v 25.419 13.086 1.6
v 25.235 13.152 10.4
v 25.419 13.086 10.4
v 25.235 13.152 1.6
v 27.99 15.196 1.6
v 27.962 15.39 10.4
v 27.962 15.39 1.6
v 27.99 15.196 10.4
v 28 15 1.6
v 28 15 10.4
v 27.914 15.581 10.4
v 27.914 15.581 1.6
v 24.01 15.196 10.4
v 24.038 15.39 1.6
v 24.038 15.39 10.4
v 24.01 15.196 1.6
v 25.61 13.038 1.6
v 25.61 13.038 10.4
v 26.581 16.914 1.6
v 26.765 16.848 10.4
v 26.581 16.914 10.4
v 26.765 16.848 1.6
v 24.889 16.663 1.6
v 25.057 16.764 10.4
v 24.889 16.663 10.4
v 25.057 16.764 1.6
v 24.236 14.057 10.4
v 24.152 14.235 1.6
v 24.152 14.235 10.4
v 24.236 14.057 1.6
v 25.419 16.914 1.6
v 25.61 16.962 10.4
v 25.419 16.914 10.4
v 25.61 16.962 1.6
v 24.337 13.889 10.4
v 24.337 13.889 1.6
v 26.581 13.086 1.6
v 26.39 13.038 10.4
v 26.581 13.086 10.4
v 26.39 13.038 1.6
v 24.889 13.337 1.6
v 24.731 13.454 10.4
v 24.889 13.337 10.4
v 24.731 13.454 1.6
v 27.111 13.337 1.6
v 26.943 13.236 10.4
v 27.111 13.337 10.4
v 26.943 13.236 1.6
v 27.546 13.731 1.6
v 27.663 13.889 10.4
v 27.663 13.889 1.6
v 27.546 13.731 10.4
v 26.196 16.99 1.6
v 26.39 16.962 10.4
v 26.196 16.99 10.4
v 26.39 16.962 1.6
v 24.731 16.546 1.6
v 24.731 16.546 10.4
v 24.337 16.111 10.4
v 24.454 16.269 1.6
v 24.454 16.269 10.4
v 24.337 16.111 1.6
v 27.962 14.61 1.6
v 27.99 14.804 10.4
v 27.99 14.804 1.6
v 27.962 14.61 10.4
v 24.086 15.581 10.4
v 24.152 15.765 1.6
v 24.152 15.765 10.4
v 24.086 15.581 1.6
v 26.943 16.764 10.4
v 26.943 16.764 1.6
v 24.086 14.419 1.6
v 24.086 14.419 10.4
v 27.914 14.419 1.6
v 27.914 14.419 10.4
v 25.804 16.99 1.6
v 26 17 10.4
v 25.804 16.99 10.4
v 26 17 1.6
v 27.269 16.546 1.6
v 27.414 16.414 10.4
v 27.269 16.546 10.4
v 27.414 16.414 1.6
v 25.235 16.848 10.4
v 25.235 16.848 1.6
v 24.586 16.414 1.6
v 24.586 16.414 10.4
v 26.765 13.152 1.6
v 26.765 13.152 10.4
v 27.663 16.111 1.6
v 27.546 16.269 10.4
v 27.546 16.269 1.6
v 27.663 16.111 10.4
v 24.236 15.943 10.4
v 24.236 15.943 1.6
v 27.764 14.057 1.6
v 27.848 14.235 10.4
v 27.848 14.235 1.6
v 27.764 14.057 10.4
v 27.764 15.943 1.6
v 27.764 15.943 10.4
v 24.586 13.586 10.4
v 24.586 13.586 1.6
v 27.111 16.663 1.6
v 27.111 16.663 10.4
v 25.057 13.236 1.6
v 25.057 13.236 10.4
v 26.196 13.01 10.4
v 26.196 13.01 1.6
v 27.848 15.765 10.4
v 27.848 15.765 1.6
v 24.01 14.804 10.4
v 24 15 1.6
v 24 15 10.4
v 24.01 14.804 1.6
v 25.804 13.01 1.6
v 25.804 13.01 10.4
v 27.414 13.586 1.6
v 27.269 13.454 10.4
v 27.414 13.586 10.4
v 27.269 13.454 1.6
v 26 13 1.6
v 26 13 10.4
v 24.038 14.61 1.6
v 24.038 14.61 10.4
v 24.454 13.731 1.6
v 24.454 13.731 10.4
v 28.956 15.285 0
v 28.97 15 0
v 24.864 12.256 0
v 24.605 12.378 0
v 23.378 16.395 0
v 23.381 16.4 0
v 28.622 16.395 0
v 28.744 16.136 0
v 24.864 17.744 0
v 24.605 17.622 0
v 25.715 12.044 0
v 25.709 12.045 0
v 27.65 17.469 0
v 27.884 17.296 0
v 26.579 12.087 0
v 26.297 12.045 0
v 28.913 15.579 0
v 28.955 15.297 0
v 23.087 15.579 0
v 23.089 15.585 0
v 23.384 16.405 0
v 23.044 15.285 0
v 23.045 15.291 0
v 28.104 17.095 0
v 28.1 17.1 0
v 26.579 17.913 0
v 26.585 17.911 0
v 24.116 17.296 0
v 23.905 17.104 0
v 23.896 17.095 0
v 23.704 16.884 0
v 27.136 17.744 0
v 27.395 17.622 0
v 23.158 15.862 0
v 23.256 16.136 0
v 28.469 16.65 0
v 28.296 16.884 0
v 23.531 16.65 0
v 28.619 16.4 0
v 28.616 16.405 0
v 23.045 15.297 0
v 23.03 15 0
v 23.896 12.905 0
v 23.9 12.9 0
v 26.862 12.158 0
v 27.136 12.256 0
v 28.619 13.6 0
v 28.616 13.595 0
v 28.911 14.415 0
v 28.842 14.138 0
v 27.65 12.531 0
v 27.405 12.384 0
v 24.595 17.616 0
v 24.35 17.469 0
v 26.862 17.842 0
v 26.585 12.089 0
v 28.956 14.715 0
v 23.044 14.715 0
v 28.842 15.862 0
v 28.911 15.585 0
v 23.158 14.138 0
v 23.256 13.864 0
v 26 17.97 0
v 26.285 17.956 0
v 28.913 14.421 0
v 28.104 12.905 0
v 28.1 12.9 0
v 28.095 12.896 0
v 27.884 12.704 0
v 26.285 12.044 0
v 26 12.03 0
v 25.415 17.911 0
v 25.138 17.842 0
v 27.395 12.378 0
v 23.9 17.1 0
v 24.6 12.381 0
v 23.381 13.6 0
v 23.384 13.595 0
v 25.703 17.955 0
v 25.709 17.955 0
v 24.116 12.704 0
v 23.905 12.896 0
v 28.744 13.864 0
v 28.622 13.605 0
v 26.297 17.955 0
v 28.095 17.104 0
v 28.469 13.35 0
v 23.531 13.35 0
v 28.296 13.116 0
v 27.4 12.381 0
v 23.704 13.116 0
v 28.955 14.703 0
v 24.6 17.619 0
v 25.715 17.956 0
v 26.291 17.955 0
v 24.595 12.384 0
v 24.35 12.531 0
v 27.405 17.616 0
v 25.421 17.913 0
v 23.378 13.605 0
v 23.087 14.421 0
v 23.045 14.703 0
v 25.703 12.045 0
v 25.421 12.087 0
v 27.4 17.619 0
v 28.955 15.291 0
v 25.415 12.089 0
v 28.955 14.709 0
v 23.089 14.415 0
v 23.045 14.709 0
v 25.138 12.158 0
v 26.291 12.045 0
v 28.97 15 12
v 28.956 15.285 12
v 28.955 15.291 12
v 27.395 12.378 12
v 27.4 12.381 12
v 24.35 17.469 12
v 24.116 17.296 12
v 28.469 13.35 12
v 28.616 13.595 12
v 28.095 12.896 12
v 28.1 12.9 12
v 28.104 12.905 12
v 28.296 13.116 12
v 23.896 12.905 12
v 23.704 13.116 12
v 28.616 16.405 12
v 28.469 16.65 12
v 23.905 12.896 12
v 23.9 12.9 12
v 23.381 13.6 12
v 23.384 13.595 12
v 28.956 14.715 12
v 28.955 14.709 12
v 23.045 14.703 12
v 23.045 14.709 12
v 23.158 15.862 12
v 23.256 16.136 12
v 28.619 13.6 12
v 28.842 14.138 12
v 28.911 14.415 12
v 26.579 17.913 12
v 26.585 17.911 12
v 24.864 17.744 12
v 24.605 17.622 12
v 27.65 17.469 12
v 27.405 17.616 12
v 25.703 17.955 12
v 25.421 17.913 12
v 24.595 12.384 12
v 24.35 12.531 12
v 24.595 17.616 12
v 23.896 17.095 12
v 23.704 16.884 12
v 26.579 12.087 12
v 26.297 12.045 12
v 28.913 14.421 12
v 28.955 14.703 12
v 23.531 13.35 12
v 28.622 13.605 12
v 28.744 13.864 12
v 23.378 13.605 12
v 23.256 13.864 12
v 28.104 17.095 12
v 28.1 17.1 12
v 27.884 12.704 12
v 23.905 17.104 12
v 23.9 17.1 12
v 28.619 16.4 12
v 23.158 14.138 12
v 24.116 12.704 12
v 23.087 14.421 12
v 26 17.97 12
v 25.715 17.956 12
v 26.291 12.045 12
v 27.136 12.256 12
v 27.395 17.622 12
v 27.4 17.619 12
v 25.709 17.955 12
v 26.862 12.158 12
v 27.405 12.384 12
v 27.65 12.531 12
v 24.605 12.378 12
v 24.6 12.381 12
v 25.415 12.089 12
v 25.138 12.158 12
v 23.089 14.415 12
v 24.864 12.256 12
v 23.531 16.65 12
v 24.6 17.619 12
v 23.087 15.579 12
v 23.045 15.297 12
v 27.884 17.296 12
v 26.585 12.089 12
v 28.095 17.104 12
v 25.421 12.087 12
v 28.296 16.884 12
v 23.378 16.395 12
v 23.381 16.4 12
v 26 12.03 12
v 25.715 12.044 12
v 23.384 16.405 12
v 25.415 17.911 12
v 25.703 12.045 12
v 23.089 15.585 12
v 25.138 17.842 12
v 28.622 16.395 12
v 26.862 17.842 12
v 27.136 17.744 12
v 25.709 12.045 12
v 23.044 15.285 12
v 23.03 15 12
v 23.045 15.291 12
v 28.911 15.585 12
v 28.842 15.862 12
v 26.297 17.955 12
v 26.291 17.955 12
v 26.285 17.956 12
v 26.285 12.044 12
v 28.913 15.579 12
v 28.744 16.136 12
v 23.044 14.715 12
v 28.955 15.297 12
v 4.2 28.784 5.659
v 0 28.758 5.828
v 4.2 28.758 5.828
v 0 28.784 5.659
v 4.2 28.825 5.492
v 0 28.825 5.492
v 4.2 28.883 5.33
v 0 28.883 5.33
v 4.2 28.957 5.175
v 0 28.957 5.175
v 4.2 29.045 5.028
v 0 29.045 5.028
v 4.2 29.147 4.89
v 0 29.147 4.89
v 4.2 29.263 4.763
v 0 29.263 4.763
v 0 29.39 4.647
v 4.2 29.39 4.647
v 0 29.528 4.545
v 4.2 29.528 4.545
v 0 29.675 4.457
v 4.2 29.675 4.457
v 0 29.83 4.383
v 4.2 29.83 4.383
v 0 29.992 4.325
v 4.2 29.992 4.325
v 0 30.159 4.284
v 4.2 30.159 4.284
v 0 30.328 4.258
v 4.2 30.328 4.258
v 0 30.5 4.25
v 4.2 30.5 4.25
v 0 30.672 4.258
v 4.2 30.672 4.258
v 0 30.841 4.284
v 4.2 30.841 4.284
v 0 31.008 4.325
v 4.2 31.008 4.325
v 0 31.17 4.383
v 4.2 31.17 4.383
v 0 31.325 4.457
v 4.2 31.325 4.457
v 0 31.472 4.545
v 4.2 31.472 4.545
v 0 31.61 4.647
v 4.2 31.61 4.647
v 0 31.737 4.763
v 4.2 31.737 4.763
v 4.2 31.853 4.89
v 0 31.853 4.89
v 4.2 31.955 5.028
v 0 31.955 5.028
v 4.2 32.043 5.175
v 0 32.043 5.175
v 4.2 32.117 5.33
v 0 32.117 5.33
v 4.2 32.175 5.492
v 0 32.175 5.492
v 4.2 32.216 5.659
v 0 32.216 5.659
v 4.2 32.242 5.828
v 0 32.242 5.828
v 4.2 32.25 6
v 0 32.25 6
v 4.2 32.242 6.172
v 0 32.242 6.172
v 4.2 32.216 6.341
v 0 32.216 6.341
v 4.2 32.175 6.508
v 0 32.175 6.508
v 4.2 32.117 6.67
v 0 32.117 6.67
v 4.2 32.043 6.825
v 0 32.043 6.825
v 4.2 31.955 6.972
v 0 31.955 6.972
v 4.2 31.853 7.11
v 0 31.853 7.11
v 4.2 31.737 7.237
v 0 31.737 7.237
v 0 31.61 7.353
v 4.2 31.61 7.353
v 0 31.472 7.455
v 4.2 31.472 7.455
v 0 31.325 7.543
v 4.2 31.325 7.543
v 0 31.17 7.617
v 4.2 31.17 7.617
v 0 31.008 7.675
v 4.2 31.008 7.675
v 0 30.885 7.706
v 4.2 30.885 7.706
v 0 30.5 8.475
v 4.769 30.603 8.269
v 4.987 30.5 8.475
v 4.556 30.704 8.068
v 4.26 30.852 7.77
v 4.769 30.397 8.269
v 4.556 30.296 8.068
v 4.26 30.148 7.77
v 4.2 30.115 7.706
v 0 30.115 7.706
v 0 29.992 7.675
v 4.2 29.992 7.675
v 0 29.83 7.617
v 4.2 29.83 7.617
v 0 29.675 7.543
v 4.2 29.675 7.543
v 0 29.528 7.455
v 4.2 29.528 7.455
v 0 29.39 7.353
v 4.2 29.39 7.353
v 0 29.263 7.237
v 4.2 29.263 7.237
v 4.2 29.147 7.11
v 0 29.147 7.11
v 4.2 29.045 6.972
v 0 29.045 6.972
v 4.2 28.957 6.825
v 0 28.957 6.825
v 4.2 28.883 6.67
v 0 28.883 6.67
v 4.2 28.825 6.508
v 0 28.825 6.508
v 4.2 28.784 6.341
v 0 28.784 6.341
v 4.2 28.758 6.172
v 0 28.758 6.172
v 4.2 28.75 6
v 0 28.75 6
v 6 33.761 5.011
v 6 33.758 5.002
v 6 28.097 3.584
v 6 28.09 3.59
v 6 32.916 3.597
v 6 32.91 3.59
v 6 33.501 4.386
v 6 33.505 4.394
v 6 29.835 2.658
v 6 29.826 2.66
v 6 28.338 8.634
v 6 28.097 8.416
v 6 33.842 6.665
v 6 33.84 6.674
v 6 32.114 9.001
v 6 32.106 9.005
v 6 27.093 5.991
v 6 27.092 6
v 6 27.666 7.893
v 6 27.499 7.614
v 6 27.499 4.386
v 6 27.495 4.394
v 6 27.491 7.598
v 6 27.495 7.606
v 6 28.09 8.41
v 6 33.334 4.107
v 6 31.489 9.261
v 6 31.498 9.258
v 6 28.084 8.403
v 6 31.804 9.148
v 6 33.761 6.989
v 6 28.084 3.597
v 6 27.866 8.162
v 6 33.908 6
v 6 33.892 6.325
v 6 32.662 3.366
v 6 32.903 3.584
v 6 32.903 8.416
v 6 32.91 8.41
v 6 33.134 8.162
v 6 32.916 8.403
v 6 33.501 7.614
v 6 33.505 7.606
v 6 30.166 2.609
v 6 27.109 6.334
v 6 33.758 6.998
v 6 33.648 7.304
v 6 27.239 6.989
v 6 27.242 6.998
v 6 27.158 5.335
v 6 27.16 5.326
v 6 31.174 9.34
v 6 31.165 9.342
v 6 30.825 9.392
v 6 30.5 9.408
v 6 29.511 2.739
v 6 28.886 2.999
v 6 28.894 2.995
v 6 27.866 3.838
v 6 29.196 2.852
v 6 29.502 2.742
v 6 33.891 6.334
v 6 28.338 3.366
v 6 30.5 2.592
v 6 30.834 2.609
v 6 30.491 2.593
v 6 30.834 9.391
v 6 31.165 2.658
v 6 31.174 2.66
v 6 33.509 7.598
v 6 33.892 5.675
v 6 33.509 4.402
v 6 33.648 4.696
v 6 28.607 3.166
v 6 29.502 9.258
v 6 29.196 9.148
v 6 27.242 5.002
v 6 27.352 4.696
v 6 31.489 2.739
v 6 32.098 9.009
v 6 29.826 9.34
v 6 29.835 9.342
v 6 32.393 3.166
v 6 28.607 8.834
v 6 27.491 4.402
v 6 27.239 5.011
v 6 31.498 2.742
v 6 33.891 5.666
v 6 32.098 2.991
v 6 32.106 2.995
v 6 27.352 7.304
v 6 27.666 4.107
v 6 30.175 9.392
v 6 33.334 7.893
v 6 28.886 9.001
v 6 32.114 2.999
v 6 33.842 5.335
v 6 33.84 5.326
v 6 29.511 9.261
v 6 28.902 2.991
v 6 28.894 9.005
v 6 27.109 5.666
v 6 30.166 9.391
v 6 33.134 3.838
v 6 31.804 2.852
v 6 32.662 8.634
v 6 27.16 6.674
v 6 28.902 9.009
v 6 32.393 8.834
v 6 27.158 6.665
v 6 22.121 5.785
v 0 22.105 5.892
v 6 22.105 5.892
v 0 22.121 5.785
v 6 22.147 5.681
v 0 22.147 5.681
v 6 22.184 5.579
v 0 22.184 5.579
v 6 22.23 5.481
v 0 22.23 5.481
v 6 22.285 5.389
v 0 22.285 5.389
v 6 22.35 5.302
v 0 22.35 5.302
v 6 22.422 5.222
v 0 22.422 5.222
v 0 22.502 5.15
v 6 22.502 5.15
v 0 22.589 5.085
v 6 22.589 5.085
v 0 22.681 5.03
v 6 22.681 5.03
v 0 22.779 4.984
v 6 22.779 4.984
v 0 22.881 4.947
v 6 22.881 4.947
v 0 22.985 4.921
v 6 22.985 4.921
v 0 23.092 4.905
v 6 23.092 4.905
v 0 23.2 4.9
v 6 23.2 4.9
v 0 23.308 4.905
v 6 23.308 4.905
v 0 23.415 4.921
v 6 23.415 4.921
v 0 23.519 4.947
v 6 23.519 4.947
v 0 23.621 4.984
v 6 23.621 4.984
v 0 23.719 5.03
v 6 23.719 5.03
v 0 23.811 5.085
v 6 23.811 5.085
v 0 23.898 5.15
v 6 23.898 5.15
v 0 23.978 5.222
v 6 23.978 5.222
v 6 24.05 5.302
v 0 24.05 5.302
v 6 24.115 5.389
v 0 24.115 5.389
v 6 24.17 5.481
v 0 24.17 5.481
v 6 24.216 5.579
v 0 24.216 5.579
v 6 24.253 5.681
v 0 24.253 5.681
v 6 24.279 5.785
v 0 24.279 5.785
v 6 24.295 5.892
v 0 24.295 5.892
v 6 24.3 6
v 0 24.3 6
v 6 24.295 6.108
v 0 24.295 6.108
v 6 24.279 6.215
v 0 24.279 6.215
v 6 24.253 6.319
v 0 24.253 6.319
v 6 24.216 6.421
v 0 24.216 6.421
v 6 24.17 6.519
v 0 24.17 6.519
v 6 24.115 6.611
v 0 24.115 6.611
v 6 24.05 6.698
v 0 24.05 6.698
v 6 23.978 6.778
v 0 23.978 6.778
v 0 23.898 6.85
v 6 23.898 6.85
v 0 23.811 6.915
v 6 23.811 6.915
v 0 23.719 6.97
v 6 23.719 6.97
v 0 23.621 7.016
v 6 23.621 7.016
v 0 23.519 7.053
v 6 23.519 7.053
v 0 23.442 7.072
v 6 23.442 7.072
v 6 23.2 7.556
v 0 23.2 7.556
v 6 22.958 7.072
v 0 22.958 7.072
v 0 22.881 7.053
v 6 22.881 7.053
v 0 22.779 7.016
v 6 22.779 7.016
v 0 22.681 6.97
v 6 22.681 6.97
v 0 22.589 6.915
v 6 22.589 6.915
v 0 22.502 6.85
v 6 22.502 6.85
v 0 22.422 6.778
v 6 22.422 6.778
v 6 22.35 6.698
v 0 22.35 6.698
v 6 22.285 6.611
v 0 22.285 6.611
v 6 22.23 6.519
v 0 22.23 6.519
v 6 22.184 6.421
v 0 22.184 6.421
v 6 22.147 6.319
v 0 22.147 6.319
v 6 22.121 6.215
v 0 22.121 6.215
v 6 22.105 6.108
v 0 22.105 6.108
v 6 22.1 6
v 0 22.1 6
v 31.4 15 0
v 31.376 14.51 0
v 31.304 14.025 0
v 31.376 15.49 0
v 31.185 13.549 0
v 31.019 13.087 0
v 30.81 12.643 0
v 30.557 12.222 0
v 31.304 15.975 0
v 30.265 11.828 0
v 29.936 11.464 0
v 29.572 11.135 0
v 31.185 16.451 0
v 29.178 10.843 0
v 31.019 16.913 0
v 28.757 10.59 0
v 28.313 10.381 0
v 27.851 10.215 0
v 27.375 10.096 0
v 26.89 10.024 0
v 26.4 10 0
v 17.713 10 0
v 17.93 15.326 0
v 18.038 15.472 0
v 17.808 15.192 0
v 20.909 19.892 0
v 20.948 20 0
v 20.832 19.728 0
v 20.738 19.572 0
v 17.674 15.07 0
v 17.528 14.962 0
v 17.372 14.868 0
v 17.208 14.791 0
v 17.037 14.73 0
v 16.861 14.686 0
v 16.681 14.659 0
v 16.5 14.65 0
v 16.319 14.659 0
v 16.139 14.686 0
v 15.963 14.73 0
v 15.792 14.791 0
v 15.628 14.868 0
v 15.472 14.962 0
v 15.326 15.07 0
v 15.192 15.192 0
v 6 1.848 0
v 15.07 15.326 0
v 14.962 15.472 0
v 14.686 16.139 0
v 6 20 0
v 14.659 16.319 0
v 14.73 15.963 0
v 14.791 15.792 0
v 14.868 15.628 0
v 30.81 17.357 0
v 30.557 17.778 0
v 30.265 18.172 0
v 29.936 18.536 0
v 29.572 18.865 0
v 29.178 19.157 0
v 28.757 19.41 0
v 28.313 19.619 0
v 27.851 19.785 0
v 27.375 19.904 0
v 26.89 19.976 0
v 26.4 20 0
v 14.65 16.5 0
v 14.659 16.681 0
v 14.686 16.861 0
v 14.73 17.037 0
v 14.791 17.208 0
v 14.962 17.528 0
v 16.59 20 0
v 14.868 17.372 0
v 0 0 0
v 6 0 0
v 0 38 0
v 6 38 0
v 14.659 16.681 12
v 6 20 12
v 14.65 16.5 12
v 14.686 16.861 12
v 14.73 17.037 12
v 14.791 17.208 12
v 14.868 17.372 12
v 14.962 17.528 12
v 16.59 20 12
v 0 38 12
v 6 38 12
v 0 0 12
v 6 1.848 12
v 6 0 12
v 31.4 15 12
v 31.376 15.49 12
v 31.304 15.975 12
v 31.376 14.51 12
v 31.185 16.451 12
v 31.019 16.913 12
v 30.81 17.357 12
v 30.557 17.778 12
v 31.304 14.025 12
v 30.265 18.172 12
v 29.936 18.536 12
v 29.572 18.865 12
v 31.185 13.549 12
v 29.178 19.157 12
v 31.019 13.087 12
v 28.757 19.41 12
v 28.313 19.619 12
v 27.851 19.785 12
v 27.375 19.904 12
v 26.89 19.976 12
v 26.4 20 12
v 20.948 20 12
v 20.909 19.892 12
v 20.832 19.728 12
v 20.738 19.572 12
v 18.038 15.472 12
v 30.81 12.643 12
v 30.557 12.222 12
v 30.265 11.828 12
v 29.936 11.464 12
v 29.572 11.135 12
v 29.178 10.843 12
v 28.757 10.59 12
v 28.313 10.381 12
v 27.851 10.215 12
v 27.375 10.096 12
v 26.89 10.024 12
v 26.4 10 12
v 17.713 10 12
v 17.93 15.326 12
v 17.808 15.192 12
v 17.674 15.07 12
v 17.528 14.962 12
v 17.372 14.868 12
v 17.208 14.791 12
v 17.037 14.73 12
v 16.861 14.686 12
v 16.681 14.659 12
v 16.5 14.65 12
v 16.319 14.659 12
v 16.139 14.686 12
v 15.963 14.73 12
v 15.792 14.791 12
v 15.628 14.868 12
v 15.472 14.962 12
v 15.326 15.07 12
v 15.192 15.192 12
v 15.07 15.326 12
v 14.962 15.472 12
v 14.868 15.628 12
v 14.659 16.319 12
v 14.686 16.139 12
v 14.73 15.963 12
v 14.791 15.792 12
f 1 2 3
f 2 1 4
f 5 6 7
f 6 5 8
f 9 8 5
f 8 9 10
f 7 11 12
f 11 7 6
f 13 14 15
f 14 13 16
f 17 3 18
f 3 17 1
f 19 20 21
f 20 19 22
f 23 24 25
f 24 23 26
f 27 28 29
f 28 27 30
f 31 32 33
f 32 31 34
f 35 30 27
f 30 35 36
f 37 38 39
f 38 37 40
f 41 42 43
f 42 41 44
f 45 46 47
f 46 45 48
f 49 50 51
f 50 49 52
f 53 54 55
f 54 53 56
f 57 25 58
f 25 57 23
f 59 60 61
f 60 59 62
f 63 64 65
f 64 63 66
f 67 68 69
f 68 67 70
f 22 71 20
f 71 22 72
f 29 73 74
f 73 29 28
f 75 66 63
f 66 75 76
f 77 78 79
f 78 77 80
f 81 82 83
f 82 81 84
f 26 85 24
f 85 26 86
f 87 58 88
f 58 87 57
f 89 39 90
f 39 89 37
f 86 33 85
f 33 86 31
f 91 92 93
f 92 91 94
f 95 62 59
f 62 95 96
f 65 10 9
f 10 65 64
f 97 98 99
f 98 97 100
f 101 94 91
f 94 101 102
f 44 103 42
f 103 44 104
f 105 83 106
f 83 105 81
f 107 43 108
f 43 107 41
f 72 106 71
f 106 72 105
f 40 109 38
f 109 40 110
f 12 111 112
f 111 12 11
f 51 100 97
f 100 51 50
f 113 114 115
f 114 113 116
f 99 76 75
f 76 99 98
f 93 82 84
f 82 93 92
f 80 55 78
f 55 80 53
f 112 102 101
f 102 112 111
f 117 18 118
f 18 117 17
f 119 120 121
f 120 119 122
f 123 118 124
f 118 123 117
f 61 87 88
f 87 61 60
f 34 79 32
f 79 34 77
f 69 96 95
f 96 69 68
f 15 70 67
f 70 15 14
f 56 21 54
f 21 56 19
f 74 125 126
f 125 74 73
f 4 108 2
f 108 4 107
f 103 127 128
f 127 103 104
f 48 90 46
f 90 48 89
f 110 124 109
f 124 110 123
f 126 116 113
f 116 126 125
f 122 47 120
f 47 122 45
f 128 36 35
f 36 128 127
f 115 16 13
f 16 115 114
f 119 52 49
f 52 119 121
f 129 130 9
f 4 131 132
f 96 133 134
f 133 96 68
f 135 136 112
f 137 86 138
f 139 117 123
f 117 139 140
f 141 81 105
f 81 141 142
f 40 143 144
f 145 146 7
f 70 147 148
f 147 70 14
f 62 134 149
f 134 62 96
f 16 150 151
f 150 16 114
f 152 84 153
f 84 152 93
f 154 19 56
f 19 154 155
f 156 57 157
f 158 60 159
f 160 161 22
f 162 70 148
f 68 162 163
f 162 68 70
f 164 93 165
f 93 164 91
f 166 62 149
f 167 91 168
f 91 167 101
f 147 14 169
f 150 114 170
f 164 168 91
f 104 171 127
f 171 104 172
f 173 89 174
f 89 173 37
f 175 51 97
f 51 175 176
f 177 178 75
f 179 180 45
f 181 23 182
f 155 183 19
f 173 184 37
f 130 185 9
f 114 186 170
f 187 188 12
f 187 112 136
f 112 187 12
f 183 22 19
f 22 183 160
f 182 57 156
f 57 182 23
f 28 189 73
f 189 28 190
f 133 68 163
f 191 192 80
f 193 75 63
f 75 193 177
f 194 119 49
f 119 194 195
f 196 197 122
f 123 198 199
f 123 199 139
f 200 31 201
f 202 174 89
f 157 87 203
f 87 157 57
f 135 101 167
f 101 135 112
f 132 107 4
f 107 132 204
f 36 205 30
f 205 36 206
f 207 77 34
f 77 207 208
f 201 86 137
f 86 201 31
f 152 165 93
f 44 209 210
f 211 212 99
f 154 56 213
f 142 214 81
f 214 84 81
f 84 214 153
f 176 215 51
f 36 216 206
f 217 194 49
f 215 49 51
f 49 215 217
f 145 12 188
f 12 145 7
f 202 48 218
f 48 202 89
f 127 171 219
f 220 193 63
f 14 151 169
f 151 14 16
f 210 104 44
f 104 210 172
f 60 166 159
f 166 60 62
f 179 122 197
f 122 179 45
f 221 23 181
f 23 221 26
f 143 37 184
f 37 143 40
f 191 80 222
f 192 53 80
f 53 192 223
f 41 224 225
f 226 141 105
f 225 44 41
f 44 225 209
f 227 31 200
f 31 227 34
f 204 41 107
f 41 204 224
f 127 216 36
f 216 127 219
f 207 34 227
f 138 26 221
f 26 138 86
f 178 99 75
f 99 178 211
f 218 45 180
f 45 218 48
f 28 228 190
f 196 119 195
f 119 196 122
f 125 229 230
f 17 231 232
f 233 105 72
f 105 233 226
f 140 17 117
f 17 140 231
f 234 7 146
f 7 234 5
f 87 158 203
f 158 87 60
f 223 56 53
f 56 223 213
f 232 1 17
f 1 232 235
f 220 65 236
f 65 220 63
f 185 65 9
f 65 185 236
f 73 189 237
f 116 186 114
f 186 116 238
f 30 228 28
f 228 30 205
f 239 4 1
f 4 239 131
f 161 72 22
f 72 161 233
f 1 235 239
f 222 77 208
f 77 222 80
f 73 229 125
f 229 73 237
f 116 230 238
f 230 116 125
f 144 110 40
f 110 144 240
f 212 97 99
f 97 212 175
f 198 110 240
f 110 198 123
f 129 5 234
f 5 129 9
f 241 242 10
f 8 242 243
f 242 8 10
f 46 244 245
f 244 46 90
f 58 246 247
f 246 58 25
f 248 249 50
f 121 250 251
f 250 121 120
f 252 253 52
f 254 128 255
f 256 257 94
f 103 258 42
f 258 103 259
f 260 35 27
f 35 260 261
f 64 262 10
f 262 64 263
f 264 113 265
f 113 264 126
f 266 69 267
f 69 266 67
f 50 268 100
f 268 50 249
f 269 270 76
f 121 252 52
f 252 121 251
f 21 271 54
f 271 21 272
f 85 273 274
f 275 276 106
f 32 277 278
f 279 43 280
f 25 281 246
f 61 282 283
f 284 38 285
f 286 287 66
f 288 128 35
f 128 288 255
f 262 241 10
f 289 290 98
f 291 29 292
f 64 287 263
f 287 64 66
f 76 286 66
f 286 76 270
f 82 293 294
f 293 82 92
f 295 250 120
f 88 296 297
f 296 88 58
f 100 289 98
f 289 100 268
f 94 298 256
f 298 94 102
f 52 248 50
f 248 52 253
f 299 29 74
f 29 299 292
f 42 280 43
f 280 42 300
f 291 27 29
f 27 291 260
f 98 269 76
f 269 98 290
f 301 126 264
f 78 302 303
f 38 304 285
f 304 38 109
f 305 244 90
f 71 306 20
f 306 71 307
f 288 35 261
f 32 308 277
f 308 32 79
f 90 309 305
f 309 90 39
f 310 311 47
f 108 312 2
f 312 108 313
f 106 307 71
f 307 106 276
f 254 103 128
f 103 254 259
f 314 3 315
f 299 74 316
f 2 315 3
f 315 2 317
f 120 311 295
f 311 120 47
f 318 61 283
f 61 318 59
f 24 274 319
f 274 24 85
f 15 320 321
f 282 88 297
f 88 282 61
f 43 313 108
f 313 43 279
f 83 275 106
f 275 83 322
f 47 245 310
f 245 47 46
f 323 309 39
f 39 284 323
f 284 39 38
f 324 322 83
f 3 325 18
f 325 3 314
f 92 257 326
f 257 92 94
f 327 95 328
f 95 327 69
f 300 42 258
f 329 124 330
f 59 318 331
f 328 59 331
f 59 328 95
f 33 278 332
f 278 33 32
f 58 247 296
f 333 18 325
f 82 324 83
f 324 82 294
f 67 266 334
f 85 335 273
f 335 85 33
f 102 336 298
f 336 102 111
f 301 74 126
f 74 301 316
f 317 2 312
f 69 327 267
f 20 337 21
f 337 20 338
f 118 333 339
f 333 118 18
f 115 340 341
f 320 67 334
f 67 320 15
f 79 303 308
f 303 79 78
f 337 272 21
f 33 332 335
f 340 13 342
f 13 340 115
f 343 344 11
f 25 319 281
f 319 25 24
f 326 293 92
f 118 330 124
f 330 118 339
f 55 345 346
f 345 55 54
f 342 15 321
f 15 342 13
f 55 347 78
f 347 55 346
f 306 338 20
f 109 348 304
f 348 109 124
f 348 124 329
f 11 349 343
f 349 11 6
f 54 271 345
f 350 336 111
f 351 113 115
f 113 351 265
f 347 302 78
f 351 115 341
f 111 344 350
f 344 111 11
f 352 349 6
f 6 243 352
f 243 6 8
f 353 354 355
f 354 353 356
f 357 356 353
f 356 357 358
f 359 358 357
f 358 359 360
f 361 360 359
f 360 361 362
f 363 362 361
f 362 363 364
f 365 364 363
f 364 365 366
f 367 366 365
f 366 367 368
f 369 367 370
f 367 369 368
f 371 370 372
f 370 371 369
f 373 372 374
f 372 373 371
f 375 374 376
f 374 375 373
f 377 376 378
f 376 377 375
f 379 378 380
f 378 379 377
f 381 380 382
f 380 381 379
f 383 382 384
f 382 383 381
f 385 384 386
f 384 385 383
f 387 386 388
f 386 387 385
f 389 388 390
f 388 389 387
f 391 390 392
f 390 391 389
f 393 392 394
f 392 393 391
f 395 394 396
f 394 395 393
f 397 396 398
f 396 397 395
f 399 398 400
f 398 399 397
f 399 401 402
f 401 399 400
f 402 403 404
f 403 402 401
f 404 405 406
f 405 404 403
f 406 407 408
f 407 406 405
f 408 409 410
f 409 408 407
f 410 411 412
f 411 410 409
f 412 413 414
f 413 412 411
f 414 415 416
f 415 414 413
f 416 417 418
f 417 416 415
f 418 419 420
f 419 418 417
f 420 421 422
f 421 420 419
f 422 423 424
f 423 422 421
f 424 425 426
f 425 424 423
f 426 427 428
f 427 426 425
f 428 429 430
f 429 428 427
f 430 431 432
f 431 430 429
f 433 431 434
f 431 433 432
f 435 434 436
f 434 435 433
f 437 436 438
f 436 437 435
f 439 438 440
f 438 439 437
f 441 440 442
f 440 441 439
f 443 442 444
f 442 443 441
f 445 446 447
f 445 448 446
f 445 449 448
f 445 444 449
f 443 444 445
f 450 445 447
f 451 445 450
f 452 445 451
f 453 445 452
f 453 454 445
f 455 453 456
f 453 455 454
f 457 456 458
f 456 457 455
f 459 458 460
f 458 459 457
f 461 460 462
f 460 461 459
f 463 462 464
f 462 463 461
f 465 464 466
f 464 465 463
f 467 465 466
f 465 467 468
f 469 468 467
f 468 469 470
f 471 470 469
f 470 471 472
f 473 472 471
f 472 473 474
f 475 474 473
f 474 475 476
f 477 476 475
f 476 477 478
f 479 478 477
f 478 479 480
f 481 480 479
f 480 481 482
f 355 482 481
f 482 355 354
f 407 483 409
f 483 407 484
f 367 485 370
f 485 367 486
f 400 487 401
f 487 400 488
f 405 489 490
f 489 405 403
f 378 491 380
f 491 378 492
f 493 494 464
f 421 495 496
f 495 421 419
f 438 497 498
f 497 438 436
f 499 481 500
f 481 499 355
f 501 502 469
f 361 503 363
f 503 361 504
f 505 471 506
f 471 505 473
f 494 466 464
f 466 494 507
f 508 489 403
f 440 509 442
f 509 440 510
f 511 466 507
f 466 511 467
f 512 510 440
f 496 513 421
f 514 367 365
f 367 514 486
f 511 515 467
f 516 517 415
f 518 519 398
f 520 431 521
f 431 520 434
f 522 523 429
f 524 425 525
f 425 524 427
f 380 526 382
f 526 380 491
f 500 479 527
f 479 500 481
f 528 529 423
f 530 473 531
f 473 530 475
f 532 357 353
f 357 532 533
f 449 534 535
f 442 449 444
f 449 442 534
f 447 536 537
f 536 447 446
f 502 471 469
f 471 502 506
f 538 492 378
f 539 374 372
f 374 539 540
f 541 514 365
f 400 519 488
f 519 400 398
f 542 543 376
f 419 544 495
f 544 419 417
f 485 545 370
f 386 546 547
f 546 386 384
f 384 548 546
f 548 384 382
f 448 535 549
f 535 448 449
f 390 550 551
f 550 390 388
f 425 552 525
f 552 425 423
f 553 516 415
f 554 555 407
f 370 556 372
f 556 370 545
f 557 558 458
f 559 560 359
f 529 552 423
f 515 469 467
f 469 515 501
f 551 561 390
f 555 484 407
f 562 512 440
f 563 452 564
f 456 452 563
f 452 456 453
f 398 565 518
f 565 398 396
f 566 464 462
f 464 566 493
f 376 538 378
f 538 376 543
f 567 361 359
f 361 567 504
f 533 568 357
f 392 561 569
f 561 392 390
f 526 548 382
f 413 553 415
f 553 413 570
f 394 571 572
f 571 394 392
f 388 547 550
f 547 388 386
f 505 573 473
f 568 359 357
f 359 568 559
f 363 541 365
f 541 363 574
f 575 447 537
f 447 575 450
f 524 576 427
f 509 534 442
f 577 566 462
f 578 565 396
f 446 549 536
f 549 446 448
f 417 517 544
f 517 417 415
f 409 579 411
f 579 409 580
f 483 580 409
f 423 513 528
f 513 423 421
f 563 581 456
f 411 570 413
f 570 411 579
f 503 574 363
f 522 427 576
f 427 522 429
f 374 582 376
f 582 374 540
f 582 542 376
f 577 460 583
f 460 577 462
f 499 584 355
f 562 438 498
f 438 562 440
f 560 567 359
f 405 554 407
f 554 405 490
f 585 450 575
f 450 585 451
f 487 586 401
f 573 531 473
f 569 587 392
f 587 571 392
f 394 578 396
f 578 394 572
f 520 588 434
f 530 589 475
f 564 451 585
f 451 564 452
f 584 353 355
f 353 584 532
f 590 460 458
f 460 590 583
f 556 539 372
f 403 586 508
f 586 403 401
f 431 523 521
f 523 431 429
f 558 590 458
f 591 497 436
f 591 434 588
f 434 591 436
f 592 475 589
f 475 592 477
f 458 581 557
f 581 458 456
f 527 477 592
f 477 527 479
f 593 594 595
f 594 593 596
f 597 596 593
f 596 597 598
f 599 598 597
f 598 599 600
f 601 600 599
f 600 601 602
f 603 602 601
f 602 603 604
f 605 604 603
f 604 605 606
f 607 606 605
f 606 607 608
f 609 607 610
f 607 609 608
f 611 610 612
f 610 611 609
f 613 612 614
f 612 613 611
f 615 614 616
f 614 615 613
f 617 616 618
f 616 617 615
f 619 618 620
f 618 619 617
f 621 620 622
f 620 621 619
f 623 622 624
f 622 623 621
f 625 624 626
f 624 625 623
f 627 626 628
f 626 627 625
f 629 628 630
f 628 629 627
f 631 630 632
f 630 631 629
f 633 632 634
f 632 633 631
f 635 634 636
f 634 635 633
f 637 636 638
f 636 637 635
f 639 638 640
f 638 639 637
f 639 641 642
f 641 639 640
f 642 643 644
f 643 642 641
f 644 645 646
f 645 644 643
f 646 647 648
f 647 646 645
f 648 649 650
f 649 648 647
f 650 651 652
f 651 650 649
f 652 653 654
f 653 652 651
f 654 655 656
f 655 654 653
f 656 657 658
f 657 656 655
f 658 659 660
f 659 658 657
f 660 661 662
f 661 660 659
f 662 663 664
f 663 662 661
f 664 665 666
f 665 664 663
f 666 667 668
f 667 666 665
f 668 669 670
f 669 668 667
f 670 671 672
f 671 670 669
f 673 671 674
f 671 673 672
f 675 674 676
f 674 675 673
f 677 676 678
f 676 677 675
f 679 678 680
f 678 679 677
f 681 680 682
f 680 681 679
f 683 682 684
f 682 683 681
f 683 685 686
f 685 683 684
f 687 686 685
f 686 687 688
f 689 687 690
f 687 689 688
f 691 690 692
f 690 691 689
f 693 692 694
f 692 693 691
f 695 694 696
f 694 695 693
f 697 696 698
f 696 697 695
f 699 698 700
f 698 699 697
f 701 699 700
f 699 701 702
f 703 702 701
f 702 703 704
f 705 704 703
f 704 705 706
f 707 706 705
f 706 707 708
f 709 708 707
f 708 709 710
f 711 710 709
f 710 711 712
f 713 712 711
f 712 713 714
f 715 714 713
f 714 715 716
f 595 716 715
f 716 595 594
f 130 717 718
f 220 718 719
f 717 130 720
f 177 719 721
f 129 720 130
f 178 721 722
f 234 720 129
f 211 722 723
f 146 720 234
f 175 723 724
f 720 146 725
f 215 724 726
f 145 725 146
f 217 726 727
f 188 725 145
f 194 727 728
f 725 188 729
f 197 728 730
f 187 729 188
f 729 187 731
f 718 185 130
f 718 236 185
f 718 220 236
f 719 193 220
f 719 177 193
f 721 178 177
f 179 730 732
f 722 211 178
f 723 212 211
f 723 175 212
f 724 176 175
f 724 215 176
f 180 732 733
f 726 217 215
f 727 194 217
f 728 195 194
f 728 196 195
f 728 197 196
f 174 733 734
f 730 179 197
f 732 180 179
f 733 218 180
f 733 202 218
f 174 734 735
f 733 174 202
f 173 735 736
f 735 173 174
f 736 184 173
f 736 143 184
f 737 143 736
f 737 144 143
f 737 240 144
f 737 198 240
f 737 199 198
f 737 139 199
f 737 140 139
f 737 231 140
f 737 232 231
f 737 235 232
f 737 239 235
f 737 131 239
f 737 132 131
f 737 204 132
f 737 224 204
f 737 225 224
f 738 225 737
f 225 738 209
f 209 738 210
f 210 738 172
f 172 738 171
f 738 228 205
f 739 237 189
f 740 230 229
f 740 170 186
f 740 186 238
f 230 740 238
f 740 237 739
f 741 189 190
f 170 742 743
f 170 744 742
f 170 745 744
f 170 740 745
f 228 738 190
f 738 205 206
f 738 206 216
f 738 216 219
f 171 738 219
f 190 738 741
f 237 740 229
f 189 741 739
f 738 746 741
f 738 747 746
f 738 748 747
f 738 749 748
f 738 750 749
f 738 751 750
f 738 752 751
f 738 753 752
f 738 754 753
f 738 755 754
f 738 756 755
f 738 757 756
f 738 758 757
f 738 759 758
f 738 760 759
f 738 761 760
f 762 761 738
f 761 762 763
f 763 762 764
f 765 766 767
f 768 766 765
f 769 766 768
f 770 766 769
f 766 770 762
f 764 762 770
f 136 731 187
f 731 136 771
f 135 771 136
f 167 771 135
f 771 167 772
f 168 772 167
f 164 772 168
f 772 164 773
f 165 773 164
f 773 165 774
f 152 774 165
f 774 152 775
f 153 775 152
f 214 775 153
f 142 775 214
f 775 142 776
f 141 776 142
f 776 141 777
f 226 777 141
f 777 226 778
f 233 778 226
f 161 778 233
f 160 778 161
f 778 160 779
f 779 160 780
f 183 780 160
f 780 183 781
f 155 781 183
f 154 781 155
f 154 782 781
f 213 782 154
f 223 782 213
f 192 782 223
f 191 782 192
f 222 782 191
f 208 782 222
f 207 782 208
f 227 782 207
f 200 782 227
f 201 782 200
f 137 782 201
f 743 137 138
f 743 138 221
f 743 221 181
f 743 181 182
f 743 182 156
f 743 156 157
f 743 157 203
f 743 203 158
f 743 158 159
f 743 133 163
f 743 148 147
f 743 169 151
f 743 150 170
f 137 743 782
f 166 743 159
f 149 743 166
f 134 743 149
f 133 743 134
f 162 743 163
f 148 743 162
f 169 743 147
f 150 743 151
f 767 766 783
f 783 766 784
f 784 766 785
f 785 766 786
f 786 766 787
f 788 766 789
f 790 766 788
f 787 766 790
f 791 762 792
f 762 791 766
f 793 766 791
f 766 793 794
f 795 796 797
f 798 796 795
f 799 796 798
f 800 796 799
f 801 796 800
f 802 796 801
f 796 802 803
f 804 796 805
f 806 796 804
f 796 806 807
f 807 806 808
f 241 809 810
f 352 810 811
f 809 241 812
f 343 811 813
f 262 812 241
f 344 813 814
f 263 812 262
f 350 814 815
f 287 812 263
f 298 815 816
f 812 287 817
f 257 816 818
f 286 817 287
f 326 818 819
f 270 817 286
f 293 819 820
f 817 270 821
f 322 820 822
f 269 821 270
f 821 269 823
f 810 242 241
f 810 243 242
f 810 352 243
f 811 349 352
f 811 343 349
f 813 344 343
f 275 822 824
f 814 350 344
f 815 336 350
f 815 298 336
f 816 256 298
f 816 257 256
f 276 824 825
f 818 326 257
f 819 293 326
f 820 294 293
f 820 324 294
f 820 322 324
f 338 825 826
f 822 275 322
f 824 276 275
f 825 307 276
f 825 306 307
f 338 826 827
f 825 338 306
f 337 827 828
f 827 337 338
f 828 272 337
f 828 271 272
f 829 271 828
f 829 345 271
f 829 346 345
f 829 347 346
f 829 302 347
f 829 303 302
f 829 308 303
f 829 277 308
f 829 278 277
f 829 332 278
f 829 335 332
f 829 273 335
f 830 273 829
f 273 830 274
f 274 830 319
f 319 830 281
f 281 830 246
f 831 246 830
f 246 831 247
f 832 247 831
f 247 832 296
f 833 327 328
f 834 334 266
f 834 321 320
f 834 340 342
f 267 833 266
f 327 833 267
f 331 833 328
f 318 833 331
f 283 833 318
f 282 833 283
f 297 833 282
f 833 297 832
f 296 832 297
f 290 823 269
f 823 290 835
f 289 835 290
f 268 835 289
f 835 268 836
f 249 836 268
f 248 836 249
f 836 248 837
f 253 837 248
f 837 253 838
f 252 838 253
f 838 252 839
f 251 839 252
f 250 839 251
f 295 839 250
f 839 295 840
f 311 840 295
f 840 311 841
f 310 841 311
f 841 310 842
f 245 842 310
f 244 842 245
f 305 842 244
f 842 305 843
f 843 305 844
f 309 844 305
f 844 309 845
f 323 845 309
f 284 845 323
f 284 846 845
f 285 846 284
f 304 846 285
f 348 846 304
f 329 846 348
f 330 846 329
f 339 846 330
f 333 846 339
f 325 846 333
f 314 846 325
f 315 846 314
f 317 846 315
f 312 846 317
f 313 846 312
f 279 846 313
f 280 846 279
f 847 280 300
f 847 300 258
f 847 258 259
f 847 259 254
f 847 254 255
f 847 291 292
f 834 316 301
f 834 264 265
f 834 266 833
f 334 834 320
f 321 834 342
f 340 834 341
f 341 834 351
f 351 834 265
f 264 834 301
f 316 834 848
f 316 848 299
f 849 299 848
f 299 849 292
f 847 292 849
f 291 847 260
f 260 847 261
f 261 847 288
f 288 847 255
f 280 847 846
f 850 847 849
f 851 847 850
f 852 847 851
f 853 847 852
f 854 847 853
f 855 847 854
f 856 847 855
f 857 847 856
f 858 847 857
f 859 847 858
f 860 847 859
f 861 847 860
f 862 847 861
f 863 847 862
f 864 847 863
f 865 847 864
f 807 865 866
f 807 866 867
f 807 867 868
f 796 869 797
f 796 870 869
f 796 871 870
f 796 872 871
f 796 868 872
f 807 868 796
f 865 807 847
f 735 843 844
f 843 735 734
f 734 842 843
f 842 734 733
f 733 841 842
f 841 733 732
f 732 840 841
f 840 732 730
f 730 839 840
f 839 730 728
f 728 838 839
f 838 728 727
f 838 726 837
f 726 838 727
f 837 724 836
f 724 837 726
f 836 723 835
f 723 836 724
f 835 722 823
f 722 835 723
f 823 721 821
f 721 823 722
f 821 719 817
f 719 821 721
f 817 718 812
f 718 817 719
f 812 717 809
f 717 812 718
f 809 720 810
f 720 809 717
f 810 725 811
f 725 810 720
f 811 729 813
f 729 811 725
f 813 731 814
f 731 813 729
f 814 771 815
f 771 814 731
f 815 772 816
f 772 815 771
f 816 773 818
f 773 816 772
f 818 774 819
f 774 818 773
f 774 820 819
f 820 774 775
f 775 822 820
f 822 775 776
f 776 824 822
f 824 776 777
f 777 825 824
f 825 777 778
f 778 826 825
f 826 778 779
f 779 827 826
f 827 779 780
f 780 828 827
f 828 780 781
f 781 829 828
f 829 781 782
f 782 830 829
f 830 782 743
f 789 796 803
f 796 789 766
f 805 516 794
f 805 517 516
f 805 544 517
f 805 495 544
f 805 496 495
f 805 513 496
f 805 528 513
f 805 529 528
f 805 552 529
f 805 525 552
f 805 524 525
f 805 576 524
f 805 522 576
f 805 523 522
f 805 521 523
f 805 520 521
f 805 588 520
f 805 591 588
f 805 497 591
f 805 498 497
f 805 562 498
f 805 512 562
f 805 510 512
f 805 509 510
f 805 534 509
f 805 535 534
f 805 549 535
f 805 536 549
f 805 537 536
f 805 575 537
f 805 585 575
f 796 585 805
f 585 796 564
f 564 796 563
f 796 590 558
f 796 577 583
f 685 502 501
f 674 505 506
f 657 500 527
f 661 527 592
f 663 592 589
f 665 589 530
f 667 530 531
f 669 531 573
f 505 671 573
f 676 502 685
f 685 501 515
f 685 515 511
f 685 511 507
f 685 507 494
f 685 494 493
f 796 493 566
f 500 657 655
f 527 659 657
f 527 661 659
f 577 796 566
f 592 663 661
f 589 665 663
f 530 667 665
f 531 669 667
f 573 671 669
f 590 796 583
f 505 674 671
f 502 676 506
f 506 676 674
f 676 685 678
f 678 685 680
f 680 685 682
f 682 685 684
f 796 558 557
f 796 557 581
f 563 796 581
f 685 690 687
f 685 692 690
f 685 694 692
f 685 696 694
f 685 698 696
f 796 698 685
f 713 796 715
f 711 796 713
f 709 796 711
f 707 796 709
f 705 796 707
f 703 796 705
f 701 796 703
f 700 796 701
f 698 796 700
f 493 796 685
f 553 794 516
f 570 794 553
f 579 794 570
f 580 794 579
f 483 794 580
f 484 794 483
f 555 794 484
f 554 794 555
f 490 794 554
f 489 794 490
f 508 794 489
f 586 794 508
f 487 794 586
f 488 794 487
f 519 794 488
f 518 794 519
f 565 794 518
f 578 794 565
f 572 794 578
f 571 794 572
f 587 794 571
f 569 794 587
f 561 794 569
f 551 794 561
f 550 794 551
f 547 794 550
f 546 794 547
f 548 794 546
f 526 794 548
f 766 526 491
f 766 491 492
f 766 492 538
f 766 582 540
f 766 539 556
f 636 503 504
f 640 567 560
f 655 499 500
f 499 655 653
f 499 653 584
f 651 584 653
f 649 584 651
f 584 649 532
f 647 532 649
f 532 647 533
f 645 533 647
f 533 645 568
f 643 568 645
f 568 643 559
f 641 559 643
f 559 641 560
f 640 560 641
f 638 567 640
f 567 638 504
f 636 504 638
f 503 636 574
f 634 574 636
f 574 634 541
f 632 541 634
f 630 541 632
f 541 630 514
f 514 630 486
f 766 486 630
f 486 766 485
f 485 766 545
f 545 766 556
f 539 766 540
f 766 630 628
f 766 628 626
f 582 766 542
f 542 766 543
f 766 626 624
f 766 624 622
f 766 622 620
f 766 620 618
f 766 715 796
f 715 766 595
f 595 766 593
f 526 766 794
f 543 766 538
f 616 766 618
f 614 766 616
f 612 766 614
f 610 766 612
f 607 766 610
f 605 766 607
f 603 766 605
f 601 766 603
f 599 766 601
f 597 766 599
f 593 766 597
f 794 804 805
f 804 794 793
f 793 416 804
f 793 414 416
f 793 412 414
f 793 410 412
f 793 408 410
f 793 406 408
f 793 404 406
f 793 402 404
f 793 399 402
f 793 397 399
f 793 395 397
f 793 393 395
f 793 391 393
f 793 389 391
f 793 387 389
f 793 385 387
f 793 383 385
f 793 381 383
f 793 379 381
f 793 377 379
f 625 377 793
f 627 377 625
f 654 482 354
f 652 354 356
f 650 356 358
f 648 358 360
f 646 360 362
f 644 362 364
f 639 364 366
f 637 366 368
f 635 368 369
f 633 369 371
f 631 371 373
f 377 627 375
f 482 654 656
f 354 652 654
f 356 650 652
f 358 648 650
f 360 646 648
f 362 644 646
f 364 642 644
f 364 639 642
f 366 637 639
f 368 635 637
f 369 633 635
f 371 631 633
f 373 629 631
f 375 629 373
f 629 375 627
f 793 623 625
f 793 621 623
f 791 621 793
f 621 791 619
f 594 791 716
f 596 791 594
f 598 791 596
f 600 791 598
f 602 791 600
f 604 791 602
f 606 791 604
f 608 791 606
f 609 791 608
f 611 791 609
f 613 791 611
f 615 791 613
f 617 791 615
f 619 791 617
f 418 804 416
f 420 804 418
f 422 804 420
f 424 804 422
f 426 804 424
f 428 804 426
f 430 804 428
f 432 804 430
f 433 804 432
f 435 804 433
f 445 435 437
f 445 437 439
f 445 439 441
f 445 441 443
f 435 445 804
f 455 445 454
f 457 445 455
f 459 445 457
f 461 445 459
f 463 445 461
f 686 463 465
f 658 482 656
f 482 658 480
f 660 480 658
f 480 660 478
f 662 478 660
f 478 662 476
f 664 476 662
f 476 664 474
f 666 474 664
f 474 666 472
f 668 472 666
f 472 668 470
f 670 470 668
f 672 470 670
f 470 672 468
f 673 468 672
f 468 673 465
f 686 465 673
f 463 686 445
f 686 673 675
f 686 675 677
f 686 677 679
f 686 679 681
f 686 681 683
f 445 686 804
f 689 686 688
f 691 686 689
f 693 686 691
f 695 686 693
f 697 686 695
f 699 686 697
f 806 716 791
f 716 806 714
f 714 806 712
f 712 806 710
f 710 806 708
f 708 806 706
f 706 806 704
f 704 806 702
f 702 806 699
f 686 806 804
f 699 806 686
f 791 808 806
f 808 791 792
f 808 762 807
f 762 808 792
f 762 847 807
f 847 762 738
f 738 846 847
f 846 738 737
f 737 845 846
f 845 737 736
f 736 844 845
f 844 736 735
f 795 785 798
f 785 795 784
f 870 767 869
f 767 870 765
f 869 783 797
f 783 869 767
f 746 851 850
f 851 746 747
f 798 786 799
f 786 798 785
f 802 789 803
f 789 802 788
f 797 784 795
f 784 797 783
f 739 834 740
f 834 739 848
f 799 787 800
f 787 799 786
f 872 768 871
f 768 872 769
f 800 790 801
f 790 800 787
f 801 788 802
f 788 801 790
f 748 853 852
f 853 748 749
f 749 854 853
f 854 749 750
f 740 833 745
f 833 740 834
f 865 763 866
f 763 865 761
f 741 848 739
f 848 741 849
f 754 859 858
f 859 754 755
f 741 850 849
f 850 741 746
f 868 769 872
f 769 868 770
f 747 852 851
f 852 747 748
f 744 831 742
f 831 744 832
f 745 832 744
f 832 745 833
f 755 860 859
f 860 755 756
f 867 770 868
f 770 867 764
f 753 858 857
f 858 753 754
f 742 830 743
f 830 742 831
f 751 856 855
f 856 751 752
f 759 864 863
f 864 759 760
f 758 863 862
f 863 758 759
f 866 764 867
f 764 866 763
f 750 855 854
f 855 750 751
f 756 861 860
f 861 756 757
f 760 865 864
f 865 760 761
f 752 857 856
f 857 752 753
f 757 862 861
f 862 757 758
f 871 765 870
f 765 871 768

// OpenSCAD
// ============================================================================
// Parametric Ceiling Light & Ornament Zig-Zag Wall Brackets
// Designed for Bambu Lab P1S (Print flat on side: Z = bracket width, 0 supports)
// ============================================================================
//
// Coordinate System (matches generate_brackets.py):
//   X-axis (0..31.4 mm): Wall back face (X=0) -> 6mm plate -> 1.00" (25.4mm) pole
//   Y-axis (0..38.0 mm): Vertical wall height (pole at Y=10..20, nail holes at Y=23.2 & 30.5)
//   Z-axis (0..12.0 mm): Bracket width & print bed height (thread hole runs along Z)
//
// Set `part_mode` below to export individual pieces or the 20-piece P1S plate:
//   "middle"      -> Middle Bracket (1" pole + 4mm flared Z-hole + top quick-hook cradle)
//   "start"       -> Start Bracket  (1" pole + 4mm flared Z-hole + figure-8 horn cleat + V-cinch slot)
//   "end"         -> End Bracket    (same universal horn cleat + V-cinch slot as Start)
//   "p1s_kit_20"  -> 20-bracket starter grid (1 Start, 1 End, 18 Middle) for 256x256mm bed

part_mode = "middle"; // ["middle", "start", "end", "p1s_kit_20"]

// --- Core Parametric Dimensions (mm) ---
plate_thickness       = 6.0;
pole_length           = 25.4;   // Exactly 1.00 inch
plate_height          = 38.0;   // 1.50 inches
bracket_width         = 12.0;   // 0.47 inches (Z print height)

pole_y_min            = 10.0;
pole_y_max            = 20.0;   // 10 mm tall pole shaft
gusset_y_min          = 1.5;
gusset_x_end          = 18.0;

// Thread eyelet along Z-axis on 1-inch pole
eyelet_x              = 26.0;
eyelet_y              = 15.0;
eyelet_diameter       = 4.0;
eyelet_flare_diameter = 6.0;
eyelet_flare_depth    = 1.6;

// Wall plate nail holes along X-axis
main_nail_y           = 30.5;
main_nail_diameter    = 3.5;
countersink_diameter  = 7.0;
countersink_depth     = 1.8;

pin_nail_y            = 23.2;
pin_nail_diameter     = 2.2;

$fn = 64;

module base_l_body() {
    total_x = plate_thickness + pole_length;
    tip_r   = (pole_y_max - pole_y_min) / 2;
    tip_cx  = total_x - tip_r;
    tip_cy  = (pole_y_min + pole_y_max) / 2;

    linear_extrude(height = bracket_width) {
        union() {
            // Vertical wall plate (X: 0..6, Y: 0..38)
            square([plate_thickness, plate_height]);

            // 1-inch horizontal pole shaft + rounded tip
            translate([plate_thickness - 1, pole_y_min])
                square([tip_cx - (plate_thickness - 1), pole_y_max - pole_y_min]);
            translate([tip_cx, tip_cy])
                circle(r = tip_r);

            // Lower triangular support gusset
            polygon(points = [
                [plate_thickness - 0.5, gusset_y_min],
                [gusset_x_end, pole_y_min + 0.2],
                [plate_thickness - 0.5, pole_y_min + 0.2]
            ]);
        }
    }
}

module horn_cleat_addon() {
    // Figure-8 horn cleat running full Z=0..12 width so it sits flat on Z=0 build plate with 0 overhangs
    linear_extrude(height = bracket_width) {
        polygon(points = [
            [14.4, 19.5],
            [19.2, 19.5],
            [19.2, 22.0],
            [23.6, 23.2],
            [23.6, 25.0],
            [10.0, 25.0],
            [10.0, 23.2],
            [14.4, 22.0]
        ]);
    }
}

module teardrop_x_hole(y_pos, z_pos, dia, length_x) {
    r = dia / 2;
    translate([-0.1, y_pos, z_pos])
    rotate([0, 90, 0])
    linear_extrude(height = length_x) {
        union() {
            circle(r = r);
            // 45-degree self-supporting teardrop apex in +Z (which is -X in rotated 2D frame)
            polygon(points = [
                [0, r * 0.7071],
                [-r * 1.4142, 0],
                [0, -r * 0.7071]
            ]);
        }
    }
}

module common_cutouts() {
    // 1. Z-axis thread through-hole + double-sided 45-degree entry flares
    translate([eyelet_x, eyelet_y, -0.1])
        cylinder(h = bracket_width + 0.2, d = eyelet_diameter);
    translate([eyelet_x, eyelet_y, -0.05])
        cylinder(h = eyelet_flare_depth + 0.05, d1 = eyelet_flare_diameter, d2 = eyelet_diameter);
    translate([eyelet_x, eyelet_y, bracket_width - eyelet_flare_depth])
        cylinder(h = eyelet_flare_depth + 0.05, d1 = eyelet_diameter, d2 = eyelet_flare_diameter);

    // 2. X-axis Main Nail/Screw Teardrop hole + countersink (zero floating overhangs!)
    teardrop_x_hole(main_nail_y, bracket_width / 2, main_nail_diameter, plate_thickness + 0.2);
    translate([plate_thickness - countersink_depth, main_nail_y, bracket_width / 2])
        rotate([0, 90, 0])
            cylinder(h = countersink_depth + 0.1, d1 = main_nail_diameter, d2 = countersink_diameter);

    // 3. X-axis Secondary Anti-Rotation Brad/Pinhole Teardrop
    teardrop_x_hole(pin_nail_y, bracket_width / 2, pin_nail_diameter, plate_thickness + 0.2);
}

module bracket(kind = "middle") {
    difference() {
        union() {
            base_l_body();
            if (kind == "start" || kind == "end") {
                horn_cleat_addon();
            }
        }
        common_cutouts();

        // Middle bracket top quick-drop J-hook cradle groove behind eyelet
        if (kind == "middle") {
            translate([0, 0, -0.1])
            linear_extrude(height = bracket_width + 0.2) {
                hull() {
                    translate([19.2, 20.6]) circle(r = 1.85);
                    translate([16.5, 16.5]) circle(r = 1.85);
                }
            }
        }

        // Start / End bracket V-pinch cinch slot under front cleat horn
        if (kind == "start" || kind == "end") {
            translate([0, 0, -0.1])
            linear_extrude(height = bracket_width + 0.2) {
                polygon(points = [
                    [18.6, 21.0],
                    [23.2, 20.4],
                    [23.2, 21.8],
                    [18.6, 21.25]
                ]);
            }
        }
    }
}

if (part_mode == "p1s_kit_20") {
    for (r = [0 : 3]) {
        for (c = [0 : 4]) {
            idx = r * 5 + c;
            translate([c * 40, r * 46, 0]) {
                if (idx == 0) bracket("start");
                else if (idx == 1) bracket("end");
                else bracket("middle");
            }
        }
    }
} else {
    bracket(part_mode);
}
